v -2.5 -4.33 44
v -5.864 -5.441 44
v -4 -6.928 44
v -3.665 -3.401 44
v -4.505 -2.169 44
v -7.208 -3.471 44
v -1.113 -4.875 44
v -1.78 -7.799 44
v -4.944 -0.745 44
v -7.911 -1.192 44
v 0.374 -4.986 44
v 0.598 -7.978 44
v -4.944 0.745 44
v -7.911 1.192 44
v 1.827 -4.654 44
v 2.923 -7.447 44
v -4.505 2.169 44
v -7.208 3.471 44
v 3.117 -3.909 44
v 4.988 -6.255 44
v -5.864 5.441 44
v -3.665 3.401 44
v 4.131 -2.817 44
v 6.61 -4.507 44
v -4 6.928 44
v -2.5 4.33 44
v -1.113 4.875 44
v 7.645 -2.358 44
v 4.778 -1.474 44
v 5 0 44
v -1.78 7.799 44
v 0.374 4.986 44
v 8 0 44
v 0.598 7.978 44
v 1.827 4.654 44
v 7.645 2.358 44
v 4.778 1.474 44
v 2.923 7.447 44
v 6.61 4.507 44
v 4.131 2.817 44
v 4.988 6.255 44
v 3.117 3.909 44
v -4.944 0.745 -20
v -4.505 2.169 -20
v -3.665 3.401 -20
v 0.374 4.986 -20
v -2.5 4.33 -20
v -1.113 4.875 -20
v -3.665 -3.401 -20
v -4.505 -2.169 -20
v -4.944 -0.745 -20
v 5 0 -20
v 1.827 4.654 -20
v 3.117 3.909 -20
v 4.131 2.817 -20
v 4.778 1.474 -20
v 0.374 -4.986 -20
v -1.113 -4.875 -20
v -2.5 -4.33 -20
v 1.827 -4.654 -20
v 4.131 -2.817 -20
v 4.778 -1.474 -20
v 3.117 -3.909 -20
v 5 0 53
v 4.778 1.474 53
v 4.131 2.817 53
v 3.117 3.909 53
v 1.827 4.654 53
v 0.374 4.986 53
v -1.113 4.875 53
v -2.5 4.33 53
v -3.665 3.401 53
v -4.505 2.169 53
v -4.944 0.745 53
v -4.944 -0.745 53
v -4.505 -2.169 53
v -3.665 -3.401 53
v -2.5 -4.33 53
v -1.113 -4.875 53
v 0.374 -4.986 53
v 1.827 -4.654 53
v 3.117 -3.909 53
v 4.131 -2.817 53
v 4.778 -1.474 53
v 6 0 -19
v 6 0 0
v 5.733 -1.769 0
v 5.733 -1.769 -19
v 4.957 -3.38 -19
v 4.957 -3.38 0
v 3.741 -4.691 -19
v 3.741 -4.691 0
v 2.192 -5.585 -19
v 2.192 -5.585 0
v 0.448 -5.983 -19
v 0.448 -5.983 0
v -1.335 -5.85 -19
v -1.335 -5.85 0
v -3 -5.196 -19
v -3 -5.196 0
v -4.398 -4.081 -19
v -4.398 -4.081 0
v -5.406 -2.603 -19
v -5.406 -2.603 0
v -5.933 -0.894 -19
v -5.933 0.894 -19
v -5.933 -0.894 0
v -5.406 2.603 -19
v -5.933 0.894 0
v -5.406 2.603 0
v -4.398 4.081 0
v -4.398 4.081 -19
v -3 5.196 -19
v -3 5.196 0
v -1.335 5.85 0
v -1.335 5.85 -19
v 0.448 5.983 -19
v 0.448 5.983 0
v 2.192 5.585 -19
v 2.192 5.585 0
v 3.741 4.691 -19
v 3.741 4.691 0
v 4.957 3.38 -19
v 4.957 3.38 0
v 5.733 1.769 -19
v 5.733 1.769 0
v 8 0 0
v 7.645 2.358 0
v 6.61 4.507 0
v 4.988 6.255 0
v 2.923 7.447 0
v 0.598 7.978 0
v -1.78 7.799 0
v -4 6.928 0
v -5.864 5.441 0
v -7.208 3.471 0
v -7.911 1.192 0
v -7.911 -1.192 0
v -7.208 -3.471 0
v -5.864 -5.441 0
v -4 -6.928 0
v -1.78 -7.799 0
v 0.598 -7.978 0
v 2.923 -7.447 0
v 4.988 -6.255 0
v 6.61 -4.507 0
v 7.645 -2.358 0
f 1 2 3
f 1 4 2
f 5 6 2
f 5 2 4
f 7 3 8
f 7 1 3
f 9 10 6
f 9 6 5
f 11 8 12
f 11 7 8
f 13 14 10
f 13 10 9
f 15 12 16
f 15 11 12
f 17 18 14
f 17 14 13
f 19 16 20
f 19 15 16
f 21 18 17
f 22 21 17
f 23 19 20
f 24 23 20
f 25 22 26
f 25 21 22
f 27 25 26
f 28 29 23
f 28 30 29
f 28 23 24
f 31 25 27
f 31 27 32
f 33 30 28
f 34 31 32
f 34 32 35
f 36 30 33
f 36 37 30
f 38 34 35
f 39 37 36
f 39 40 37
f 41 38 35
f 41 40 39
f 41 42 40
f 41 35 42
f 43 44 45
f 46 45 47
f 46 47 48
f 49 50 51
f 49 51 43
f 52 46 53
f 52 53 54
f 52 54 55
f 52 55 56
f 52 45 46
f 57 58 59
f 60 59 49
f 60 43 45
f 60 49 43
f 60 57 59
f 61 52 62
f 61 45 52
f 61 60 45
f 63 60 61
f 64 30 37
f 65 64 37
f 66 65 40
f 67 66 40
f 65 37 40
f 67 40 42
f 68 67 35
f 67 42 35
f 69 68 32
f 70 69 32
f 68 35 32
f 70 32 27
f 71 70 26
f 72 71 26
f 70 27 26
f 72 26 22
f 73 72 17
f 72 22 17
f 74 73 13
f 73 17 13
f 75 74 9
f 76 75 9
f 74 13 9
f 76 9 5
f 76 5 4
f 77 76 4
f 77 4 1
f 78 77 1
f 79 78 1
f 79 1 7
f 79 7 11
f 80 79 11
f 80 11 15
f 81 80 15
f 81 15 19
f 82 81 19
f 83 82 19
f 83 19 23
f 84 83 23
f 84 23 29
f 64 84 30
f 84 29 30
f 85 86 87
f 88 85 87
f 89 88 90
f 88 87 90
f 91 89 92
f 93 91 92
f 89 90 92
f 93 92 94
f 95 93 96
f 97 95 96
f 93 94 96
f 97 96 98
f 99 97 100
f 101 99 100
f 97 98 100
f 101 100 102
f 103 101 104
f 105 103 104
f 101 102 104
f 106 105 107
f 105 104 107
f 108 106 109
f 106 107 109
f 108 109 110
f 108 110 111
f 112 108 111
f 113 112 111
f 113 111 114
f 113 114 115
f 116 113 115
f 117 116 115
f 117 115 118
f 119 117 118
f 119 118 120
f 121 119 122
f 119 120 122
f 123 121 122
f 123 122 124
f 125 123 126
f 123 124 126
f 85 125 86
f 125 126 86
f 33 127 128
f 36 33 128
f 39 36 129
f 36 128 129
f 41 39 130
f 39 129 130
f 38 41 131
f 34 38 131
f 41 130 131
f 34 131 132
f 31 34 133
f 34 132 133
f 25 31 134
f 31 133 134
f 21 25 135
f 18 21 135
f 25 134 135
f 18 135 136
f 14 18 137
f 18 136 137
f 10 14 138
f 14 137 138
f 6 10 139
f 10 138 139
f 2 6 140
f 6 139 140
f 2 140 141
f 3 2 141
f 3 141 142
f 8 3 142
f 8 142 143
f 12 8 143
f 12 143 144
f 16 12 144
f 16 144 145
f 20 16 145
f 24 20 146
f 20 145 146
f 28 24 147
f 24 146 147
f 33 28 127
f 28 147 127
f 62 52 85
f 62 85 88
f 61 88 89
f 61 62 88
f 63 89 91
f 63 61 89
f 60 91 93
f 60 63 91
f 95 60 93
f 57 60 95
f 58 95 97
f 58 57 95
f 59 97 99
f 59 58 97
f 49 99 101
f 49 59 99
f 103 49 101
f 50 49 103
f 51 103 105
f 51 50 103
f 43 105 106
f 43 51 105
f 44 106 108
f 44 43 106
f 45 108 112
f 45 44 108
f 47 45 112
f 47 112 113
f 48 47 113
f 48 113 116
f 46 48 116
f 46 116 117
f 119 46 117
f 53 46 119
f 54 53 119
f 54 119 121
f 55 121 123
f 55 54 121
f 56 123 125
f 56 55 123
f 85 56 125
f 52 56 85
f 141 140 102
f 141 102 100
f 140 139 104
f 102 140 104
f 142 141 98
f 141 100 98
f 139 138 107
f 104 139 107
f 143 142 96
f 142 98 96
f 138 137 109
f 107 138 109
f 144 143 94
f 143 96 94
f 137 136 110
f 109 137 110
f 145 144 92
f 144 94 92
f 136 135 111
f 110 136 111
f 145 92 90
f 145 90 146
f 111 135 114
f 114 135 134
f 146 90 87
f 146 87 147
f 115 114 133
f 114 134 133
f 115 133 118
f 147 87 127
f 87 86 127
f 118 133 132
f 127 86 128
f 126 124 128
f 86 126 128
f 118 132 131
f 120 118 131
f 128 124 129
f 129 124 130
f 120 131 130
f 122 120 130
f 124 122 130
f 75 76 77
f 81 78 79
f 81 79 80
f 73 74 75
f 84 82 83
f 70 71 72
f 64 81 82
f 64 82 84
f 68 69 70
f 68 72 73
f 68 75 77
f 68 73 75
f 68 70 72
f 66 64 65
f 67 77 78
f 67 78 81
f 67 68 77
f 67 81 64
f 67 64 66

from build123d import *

# Parameters (mm, degrees)
ESQUISSE1_R          = 8
BASE_EXTRUSION_DEPTH = 44
ESQUISSE2_R          = 5
BOSS_EXTRU_1_DEPTH   = 9
ESQUISSE3_R          = 6
BOSS_EXTRU_2_DEPTH   = 20
CHANFREIN1_SIZE      = 1


with BuildPart() as part:
    # Esquisse1 → Base-Extrusion (new body)
    with BuildSketch(Plane.XY):
        Circle(ESQUISSE1_R)
    extrude(amount=BASE_EXTRUSION_DEPTH)

    # Esquisse2 → Boss.-Extru.1 (add)
    with BuildSketch(Plane.XY.offset(44)):
        Circle(ESQUISSE2_R)
    extrude(amount=BOSS_EXTRU_1_DEPTH)

    # Esquisse3 → Boss.-Extru.2 (add)
    with BuildSketch(Plane(origin=(0, 0, 0), x_dir=(-1, 0, 0), z_dir=(0, 0, -1))):
        with Locations(Location((0, 0, 0), (0, 0, 180))):
            Circle(ESQUISSE3_R)
    extrude(amount=BOSS_EXTRU_2_DEPTH)

    # Chanfrein1
    chanfrein1_edges = [part.edges().sort_by_distance(p)[0] for p in [
        (-6, 0, -20),
    ]]
    chamfer(chanfrein1_edges, length=CHANFREIN1_SIZE)


solid = part.part
